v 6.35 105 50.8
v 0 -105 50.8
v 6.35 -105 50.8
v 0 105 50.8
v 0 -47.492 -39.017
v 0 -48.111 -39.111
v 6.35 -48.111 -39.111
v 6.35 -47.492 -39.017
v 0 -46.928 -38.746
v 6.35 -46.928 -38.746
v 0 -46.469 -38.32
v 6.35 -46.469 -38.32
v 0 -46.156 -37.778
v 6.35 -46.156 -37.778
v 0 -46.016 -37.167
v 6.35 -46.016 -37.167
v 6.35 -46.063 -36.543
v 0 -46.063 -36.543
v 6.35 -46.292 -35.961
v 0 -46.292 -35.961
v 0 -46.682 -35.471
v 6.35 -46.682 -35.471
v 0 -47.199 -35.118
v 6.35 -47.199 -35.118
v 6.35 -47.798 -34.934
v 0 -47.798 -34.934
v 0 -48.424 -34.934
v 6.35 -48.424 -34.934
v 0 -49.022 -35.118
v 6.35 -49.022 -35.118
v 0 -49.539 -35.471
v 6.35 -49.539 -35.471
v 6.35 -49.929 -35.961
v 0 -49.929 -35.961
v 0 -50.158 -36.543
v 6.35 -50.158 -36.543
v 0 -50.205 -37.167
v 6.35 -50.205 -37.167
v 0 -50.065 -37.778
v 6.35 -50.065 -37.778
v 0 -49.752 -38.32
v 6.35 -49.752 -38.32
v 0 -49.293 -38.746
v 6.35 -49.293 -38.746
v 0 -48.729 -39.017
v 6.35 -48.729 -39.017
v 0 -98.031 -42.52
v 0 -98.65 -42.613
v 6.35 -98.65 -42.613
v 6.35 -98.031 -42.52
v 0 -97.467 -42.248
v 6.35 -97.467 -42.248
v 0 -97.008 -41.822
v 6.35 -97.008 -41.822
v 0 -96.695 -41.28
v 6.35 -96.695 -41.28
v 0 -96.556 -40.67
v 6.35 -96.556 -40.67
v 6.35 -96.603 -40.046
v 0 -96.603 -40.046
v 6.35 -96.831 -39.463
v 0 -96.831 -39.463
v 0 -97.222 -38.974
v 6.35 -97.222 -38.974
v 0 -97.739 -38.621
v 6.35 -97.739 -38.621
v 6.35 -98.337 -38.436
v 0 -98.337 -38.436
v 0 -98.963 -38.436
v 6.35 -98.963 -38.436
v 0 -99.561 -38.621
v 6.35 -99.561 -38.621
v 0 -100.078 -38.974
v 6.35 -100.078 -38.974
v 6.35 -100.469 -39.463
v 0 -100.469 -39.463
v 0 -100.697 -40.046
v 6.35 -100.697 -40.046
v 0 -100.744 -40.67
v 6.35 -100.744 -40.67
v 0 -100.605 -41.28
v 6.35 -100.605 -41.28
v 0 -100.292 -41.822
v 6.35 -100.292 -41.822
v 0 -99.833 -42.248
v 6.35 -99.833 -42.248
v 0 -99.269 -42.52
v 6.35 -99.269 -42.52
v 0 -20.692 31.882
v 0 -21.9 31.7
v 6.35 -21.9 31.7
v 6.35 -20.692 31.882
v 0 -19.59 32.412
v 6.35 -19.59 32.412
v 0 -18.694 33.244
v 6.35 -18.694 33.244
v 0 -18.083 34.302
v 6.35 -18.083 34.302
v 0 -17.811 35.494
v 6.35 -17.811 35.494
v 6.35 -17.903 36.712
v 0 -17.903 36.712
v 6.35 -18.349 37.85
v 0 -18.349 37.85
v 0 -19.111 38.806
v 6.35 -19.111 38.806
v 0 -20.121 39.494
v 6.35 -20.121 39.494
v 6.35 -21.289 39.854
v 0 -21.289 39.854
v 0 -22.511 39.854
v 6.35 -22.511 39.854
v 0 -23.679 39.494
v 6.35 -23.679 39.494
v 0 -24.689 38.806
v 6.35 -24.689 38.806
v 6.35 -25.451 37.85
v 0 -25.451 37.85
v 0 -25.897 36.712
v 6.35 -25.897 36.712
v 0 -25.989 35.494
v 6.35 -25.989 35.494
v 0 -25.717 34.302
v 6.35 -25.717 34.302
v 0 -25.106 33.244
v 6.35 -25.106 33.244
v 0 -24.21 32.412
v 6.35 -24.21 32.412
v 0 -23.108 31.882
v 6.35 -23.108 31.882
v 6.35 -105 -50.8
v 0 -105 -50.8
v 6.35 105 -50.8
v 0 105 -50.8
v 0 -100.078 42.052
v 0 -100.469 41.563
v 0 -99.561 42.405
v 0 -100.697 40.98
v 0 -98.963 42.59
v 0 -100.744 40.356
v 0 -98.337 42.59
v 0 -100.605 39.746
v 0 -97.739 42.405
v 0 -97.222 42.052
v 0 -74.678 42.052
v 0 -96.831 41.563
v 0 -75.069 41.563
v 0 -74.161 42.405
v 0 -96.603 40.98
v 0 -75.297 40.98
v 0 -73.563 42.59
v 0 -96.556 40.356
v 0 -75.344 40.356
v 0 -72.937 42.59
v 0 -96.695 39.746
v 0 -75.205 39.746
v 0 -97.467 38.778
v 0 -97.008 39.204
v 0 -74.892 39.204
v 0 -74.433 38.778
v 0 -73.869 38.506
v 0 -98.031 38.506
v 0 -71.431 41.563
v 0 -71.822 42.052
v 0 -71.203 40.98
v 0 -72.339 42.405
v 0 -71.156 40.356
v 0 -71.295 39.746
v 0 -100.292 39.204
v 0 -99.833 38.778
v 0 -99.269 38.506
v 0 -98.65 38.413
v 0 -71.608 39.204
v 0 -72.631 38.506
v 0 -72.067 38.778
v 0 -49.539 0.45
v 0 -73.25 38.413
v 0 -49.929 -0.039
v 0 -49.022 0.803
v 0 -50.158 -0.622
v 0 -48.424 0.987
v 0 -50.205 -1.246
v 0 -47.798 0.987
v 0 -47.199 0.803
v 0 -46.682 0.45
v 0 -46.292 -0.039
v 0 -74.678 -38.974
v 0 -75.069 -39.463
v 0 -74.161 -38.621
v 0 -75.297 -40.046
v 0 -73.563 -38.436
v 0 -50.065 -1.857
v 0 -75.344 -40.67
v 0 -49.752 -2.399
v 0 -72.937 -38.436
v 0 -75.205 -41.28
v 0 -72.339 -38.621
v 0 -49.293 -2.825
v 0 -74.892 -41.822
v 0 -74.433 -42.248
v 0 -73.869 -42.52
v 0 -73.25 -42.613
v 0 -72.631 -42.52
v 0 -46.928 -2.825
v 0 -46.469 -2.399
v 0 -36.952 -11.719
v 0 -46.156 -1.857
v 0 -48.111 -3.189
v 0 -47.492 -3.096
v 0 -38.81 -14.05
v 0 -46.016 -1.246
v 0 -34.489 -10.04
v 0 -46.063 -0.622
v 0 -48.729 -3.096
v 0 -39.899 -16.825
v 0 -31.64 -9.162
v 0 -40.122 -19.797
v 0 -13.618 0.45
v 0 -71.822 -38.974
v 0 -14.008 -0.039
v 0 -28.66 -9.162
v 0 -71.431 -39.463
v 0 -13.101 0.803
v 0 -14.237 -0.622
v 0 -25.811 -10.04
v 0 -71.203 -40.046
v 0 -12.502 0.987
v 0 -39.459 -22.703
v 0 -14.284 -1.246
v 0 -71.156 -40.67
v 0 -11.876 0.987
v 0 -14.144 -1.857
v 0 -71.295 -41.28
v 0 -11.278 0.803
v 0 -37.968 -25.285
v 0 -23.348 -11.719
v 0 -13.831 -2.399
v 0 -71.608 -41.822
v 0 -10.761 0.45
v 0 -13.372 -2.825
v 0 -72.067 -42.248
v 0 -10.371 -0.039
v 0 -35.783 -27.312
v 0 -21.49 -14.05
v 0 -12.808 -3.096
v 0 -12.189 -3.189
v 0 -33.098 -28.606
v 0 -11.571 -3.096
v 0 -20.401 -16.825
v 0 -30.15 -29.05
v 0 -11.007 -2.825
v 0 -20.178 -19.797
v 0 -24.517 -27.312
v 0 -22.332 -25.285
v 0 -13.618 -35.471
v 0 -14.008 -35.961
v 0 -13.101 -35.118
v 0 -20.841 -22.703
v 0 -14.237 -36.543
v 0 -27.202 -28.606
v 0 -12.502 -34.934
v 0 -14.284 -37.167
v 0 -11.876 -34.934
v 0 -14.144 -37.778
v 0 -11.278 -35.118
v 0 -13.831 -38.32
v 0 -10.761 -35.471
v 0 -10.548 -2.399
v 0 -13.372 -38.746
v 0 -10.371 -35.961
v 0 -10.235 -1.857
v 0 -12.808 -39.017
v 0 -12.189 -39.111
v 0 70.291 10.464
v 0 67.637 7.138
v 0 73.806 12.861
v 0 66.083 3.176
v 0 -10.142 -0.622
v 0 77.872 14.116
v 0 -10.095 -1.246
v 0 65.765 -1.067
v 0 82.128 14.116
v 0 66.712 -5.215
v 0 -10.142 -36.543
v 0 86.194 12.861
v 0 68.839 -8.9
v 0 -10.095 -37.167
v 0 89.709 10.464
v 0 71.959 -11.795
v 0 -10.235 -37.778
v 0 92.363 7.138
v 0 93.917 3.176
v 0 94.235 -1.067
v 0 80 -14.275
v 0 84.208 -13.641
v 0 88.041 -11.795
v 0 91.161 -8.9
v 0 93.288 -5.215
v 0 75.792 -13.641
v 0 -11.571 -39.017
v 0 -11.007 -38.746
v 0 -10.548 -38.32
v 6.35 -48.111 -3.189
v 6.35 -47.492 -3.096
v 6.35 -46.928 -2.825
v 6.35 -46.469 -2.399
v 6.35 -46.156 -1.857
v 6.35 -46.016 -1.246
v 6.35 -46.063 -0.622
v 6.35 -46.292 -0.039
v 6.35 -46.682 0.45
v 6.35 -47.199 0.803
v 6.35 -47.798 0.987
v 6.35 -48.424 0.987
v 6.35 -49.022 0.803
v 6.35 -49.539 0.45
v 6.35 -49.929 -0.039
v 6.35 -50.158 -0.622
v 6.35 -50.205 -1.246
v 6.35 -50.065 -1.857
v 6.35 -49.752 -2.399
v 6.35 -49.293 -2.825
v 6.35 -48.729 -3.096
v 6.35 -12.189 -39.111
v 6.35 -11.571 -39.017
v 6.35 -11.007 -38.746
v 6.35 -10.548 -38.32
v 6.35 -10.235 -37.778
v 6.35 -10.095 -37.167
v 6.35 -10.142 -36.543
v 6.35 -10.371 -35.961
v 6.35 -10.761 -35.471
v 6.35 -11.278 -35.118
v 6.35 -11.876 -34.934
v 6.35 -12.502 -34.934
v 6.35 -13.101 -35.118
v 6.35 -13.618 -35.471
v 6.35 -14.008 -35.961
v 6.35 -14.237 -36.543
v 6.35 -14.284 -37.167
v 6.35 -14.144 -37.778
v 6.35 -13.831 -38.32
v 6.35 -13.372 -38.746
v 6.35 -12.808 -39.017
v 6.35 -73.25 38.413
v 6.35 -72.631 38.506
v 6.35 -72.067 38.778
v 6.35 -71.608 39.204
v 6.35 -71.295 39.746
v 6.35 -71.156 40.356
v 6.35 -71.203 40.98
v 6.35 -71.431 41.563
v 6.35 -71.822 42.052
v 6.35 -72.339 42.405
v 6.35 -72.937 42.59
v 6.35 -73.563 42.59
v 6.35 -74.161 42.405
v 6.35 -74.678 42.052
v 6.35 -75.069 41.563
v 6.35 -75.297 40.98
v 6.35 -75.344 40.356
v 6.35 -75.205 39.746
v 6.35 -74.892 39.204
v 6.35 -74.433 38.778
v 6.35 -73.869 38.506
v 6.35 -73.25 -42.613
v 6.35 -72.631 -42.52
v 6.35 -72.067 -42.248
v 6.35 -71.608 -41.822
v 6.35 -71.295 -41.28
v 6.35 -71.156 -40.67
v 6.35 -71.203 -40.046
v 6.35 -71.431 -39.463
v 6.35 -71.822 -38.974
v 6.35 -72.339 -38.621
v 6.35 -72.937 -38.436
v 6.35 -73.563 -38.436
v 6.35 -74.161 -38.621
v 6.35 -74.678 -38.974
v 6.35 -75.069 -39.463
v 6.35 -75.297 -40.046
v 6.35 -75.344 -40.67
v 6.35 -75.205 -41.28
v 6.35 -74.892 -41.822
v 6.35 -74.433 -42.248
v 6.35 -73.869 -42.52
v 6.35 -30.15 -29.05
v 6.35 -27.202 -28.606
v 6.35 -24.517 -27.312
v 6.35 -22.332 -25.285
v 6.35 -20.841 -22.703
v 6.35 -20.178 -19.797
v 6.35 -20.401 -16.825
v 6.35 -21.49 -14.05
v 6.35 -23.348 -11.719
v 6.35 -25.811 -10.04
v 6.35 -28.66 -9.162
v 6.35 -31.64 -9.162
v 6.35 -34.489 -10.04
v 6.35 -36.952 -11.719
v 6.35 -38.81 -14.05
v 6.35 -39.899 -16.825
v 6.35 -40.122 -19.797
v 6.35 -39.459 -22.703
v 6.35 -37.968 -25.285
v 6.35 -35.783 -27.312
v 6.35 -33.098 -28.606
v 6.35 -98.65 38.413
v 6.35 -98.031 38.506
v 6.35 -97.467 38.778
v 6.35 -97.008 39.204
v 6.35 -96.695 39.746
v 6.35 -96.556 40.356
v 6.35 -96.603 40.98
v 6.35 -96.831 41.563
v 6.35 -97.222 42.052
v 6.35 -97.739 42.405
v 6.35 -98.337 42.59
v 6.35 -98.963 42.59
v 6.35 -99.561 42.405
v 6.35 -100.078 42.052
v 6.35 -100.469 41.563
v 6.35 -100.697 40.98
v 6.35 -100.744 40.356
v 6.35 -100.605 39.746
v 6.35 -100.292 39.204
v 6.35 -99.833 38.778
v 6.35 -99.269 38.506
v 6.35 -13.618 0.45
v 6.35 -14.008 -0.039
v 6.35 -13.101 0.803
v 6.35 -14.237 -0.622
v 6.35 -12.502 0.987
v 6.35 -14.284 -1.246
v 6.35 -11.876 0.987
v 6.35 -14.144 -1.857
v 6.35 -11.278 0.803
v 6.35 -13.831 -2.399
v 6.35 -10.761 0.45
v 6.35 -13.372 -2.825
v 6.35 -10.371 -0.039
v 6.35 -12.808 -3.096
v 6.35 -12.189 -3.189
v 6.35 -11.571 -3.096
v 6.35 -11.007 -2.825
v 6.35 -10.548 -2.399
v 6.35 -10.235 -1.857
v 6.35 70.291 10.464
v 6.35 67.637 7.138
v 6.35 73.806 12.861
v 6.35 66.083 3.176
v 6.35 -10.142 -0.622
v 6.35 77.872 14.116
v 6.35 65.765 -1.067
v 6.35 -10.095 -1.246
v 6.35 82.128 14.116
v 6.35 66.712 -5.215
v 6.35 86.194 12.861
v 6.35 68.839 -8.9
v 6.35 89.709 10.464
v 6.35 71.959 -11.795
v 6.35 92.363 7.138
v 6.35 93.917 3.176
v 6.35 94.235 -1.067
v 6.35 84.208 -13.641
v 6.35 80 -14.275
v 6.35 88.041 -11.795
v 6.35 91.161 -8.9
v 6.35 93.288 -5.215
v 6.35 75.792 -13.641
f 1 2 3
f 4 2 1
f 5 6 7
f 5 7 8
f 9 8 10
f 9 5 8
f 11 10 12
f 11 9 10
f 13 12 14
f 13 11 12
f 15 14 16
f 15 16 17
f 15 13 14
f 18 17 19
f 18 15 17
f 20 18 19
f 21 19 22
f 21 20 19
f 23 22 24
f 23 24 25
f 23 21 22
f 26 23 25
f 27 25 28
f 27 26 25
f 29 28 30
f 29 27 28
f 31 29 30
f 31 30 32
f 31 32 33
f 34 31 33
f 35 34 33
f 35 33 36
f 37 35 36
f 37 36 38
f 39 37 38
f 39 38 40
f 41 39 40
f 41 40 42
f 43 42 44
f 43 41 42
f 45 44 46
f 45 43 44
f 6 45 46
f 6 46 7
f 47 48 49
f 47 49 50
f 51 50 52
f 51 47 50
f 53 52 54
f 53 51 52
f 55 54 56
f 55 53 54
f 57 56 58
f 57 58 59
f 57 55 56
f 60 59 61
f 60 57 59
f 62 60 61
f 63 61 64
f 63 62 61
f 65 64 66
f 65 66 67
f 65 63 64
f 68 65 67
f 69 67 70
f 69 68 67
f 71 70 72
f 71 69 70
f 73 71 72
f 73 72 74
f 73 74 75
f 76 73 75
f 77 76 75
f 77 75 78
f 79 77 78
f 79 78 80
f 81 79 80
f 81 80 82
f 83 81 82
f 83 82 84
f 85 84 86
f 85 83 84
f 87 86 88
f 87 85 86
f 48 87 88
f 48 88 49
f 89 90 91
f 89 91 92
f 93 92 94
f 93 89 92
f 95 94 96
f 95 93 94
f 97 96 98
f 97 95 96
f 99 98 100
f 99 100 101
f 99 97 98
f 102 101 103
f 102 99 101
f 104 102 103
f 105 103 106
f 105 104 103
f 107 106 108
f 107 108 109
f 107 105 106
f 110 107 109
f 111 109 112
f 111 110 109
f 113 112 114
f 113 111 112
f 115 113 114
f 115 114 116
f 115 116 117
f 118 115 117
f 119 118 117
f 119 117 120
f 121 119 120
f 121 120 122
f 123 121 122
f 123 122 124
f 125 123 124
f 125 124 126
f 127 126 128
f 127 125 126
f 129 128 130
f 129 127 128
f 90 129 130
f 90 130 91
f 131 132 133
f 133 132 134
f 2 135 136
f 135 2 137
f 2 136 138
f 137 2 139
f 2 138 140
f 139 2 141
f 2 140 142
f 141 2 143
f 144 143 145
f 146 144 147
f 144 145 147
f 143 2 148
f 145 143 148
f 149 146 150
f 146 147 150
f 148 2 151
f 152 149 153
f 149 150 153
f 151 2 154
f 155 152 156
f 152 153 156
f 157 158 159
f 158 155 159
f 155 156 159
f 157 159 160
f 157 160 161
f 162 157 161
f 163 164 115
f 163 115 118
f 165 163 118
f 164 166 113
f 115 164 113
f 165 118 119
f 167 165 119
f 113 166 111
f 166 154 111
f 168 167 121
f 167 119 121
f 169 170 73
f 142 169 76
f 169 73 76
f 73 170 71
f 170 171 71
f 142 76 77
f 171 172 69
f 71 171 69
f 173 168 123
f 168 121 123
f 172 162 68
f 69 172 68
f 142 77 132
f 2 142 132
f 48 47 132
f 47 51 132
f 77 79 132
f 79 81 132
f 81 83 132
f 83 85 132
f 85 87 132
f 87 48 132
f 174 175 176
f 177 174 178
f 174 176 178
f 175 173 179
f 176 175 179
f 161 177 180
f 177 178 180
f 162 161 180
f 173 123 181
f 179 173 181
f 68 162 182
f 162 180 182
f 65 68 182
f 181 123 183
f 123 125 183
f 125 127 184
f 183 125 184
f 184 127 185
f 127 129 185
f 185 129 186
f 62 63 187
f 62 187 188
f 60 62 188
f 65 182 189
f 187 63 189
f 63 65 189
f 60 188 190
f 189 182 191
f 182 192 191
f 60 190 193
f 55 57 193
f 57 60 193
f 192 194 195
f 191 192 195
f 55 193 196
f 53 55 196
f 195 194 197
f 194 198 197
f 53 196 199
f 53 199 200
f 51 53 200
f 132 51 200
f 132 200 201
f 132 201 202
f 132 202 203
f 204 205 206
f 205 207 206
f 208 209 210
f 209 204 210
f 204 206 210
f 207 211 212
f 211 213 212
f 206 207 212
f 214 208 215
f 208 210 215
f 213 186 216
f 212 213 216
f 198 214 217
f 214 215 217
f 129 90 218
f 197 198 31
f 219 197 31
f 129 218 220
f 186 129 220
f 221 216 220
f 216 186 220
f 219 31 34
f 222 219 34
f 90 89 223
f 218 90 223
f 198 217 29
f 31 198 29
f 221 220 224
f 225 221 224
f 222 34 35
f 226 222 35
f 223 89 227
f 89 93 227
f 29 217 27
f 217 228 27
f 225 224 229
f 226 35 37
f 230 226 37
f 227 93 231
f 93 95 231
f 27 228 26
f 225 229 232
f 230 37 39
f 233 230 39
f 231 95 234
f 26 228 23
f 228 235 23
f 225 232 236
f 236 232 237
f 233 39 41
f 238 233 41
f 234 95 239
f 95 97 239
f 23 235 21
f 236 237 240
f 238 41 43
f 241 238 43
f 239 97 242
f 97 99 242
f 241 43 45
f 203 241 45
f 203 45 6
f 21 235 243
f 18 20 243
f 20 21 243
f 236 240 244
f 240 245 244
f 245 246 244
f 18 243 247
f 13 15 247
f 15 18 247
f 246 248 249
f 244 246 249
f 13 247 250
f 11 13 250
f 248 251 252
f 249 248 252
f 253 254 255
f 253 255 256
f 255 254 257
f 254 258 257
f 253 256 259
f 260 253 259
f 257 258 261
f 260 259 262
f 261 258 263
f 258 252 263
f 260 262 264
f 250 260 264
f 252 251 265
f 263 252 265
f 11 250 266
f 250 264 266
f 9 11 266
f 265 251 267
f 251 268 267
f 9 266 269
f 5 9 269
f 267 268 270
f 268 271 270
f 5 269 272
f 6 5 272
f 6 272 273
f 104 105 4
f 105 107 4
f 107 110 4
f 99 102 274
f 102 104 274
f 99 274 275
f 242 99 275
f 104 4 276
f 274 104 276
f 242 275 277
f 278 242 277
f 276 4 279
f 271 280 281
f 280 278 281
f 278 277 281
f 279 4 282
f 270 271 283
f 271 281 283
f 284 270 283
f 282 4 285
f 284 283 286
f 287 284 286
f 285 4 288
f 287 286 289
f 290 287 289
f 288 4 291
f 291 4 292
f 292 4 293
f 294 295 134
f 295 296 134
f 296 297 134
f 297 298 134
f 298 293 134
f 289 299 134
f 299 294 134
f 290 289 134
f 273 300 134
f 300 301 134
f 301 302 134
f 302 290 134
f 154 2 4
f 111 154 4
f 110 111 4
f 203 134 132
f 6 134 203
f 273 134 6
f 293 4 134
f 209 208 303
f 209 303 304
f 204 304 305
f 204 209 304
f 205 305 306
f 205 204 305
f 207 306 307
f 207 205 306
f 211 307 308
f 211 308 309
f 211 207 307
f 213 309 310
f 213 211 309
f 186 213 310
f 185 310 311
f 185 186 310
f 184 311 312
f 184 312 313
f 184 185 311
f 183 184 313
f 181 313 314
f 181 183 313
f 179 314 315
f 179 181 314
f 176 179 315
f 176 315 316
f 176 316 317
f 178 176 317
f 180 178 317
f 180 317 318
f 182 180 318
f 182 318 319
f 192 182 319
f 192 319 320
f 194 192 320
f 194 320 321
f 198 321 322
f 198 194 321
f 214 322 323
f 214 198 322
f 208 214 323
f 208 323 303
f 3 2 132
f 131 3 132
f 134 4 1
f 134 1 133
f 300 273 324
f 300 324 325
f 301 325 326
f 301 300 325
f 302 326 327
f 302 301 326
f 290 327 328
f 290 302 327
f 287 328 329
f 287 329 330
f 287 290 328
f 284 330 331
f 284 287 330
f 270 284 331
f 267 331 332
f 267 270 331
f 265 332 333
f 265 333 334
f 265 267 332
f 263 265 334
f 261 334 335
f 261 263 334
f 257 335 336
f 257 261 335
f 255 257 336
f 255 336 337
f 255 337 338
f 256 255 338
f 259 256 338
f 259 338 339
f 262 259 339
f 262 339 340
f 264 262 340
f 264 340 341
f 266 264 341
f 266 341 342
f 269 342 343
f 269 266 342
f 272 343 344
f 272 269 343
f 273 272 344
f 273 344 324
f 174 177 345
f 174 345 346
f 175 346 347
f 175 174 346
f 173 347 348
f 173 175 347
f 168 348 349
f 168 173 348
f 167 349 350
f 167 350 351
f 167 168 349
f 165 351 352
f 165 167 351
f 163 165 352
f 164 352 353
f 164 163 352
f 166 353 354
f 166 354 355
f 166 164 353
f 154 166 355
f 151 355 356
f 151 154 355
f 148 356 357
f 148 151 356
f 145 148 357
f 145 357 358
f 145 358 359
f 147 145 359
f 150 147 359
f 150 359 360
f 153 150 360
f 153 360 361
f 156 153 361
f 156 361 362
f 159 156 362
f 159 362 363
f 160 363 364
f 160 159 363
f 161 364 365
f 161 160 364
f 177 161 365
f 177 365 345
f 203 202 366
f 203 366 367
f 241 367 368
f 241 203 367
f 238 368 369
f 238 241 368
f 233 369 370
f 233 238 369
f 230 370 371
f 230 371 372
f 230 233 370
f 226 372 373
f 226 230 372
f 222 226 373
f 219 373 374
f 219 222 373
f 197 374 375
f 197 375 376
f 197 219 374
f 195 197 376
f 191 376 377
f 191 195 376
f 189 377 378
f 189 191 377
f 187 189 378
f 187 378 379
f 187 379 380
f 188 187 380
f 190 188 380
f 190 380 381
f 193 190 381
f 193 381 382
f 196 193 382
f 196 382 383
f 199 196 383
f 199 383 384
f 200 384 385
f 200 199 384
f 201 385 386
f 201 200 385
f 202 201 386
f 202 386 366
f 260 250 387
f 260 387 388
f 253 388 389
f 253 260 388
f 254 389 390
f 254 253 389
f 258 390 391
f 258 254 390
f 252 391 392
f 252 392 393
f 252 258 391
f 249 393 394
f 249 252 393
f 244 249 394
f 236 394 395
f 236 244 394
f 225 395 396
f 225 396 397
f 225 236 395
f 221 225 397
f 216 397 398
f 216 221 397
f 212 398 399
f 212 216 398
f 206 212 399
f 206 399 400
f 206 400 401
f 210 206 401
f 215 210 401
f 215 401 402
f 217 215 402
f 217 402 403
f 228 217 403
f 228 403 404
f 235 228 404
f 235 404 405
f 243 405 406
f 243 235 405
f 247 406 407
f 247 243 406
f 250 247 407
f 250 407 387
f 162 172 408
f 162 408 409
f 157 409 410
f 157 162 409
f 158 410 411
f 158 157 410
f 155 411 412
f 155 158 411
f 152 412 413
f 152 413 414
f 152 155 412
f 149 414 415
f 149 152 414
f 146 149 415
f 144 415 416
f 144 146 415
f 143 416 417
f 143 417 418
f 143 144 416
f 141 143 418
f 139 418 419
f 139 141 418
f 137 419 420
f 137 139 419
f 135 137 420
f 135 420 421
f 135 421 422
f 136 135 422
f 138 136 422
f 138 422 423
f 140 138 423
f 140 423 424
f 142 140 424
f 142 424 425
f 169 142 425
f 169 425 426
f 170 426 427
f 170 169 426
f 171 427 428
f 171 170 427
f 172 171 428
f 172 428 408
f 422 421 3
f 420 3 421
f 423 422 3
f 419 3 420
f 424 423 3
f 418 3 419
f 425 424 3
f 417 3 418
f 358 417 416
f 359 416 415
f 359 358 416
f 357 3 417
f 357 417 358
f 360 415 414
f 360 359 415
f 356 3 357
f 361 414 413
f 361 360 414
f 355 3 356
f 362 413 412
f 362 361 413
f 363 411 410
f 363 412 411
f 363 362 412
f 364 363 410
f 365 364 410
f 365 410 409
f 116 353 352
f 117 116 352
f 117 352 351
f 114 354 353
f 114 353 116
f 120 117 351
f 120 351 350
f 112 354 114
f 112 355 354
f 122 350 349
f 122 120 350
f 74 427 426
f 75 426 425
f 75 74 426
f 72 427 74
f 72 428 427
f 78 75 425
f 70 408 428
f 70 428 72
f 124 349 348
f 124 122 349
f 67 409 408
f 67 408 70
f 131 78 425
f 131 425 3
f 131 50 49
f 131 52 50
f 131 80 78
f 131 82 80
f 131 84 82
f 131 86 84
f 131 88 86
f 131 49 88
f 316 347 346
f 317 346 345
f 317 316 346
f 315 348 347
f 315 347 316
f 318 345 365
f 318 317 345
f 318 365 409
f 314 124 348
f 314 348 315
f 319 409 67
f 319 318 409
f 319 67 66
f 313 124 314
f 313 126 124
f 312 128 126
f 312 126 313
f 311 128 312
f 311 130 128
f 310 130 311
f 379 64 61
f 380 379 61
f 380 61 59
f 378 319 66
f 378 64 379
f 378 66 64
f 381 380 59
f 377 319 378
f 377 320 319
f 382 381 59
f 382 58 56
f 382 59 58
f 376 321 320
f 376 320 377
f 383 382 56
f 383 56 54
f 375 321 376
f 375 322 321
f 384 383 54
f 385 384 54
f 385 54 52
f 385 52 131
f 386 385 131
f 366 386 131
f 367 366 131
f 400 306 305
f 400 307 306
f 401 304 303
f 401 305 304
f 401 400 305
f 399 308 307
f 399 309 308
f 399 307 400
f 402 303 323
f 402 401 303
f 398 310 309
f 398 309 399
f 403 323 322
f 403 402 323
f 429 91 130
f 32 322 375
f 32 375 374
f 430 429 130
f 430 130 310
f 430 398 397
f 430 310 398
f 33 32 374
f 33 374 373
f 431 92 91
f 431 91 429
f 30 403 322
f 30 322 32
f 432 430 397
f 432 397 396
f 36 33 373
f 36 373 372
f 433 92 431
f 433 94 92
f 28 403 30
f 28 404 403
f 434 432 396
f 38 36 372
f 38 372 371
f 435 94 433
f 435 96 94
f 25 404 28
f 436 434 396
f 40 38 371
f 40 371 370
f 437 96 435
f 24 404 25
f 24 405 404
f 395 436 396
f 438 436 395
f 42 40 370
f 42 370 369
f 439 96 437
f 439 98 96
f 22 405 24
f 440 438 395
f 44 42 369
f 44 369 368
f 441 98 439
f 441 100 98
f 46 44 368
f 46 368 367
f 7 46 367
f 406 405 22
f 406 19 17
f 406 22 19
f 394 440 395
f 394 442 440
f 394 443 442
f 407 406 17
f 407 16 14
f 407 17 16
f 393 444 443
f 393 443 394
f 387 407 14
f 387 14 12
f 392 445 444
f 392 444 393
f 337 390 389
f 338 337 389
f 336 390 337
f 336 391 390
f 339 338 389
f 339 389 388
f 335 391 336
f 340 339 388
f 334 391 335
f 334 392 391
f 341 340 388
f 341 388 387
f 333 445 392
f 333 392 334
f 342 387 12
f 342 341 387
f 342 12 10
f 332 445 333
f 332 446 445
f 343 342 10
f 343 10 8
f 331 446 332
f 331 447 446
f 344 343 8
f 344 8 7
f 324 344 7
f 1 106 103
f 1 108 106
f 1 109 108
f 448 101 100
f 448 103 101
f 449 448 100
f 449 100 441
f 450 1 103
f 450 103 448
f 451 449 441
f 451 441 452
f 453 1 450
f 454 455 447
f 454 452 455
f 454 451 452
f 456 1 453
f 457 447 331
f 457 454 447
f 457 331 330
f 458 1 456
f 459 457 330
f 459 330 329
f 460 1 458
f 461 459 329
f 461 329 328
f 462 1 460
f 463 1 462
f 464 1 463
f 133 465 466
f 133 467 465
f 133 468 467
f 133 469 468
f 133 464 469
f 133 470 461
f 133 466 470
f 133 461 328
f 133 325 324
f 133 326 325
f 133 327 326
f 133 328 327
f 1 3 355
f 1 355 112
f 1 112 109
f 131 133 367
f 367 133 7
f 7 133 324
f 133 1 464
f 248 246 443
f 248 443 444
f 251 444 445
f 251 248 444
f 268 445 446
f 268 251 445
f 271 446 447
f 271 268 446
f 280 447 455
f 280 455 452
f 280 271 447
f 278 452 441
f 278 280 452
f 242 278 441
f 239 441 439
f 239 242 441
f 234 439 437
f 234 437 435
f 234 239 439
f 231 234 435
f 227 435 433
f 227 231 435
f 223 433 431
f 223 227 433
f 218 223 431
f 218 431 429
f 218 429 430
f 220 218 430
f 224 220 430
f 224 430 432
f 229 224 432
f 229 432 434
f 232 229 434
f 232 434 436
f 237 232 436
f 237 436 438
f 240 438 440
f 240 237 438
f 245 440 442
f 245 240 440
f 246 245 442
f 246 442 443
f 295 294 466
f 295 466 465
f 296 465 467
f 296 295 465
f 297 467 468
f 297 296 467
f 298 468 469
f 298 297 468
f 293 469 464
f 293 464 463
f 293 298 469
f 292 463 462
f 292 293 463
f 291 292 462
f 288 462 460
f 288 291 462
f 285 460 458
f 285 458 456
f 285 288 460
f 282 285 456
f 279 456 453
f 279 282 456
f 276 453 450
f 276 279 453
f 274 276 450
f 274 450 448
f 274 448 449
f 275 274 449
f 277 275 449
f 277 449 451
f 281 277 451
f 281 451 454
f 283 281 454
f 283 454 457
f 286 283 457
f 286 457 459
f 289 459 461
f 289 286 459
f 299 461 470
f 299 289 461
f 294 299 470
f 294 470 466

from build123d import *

# Parameters (mm, degrees)
SKETCH1_W           = 101.6
SKETCH1_H           = 210
SKETCH1_R           = 2.1
SKETCH1_R_2         = 10
SKETCH1_R_3         = 4.1
SKETCH1_R_4         = 14.275
BOSS_EXTRUDE1_DEPTH = 6.35


with BuildPart() as part:
    # Sketch1 → Boss-Extrude1 (new body)
    with BuildSketch(Plane(origin=(0, 0, 0), x_dir=(0, 0, -1), z_dir=(1, 0, 0))):
        Rectangle(SKETCH1_W, SKETCH1_H)
        with Locations((-40.513, -98.65)):
            Circle(SKETCH1_R, mode=Mode.SUBTRACT)
        with Locations((40.513, -98.65)):
            Circle(SKETCH1_R, mode=Mode.SUBTRACT)
        with Locations((19.05, -30.15)):
            Circle(SKETCH1_R_2, mode=Mode.SUBTRACT)
        with Locations((37.010512242, -12.189487758)):
            Circle(SKETCH1_R, mode=Mode.SUBTRACT)
        with Locations((1.089487758, -48.110512242)):
            Circle(SKETCH1_R, mode=Mode.SUBTRACT)
        with Locations((1.089487758, -12.189487758)):
            Circle(SKETCH1_R, mode=Mode.SUBTRACT)
        with Locations((37.010512242, -48.110512242)):
            Circle(SKETCH1_R, mode=Mode.SUBTRACT)
        with Locations((-35.8, -21.9)):
            Circle(SKETCH1_R_3, mode=Mode.SUBTRACT)
        with Locations((0, 80)):
            Circle(SKETCH1_R_4, mode=Mode.SUBTRACT)
        with Locations((-40.513, -73.25)):
            Circle(SKETCH1_R, mode=Mode.SUBTRACT)
        with Locations((40.513, -73.25)):
            Circle(SKETCH1_R, mode=Mode.SUBTRACT)
    extrude(amount=BOSS_EXTRUDE1_DEPTH)


solid = part.part
